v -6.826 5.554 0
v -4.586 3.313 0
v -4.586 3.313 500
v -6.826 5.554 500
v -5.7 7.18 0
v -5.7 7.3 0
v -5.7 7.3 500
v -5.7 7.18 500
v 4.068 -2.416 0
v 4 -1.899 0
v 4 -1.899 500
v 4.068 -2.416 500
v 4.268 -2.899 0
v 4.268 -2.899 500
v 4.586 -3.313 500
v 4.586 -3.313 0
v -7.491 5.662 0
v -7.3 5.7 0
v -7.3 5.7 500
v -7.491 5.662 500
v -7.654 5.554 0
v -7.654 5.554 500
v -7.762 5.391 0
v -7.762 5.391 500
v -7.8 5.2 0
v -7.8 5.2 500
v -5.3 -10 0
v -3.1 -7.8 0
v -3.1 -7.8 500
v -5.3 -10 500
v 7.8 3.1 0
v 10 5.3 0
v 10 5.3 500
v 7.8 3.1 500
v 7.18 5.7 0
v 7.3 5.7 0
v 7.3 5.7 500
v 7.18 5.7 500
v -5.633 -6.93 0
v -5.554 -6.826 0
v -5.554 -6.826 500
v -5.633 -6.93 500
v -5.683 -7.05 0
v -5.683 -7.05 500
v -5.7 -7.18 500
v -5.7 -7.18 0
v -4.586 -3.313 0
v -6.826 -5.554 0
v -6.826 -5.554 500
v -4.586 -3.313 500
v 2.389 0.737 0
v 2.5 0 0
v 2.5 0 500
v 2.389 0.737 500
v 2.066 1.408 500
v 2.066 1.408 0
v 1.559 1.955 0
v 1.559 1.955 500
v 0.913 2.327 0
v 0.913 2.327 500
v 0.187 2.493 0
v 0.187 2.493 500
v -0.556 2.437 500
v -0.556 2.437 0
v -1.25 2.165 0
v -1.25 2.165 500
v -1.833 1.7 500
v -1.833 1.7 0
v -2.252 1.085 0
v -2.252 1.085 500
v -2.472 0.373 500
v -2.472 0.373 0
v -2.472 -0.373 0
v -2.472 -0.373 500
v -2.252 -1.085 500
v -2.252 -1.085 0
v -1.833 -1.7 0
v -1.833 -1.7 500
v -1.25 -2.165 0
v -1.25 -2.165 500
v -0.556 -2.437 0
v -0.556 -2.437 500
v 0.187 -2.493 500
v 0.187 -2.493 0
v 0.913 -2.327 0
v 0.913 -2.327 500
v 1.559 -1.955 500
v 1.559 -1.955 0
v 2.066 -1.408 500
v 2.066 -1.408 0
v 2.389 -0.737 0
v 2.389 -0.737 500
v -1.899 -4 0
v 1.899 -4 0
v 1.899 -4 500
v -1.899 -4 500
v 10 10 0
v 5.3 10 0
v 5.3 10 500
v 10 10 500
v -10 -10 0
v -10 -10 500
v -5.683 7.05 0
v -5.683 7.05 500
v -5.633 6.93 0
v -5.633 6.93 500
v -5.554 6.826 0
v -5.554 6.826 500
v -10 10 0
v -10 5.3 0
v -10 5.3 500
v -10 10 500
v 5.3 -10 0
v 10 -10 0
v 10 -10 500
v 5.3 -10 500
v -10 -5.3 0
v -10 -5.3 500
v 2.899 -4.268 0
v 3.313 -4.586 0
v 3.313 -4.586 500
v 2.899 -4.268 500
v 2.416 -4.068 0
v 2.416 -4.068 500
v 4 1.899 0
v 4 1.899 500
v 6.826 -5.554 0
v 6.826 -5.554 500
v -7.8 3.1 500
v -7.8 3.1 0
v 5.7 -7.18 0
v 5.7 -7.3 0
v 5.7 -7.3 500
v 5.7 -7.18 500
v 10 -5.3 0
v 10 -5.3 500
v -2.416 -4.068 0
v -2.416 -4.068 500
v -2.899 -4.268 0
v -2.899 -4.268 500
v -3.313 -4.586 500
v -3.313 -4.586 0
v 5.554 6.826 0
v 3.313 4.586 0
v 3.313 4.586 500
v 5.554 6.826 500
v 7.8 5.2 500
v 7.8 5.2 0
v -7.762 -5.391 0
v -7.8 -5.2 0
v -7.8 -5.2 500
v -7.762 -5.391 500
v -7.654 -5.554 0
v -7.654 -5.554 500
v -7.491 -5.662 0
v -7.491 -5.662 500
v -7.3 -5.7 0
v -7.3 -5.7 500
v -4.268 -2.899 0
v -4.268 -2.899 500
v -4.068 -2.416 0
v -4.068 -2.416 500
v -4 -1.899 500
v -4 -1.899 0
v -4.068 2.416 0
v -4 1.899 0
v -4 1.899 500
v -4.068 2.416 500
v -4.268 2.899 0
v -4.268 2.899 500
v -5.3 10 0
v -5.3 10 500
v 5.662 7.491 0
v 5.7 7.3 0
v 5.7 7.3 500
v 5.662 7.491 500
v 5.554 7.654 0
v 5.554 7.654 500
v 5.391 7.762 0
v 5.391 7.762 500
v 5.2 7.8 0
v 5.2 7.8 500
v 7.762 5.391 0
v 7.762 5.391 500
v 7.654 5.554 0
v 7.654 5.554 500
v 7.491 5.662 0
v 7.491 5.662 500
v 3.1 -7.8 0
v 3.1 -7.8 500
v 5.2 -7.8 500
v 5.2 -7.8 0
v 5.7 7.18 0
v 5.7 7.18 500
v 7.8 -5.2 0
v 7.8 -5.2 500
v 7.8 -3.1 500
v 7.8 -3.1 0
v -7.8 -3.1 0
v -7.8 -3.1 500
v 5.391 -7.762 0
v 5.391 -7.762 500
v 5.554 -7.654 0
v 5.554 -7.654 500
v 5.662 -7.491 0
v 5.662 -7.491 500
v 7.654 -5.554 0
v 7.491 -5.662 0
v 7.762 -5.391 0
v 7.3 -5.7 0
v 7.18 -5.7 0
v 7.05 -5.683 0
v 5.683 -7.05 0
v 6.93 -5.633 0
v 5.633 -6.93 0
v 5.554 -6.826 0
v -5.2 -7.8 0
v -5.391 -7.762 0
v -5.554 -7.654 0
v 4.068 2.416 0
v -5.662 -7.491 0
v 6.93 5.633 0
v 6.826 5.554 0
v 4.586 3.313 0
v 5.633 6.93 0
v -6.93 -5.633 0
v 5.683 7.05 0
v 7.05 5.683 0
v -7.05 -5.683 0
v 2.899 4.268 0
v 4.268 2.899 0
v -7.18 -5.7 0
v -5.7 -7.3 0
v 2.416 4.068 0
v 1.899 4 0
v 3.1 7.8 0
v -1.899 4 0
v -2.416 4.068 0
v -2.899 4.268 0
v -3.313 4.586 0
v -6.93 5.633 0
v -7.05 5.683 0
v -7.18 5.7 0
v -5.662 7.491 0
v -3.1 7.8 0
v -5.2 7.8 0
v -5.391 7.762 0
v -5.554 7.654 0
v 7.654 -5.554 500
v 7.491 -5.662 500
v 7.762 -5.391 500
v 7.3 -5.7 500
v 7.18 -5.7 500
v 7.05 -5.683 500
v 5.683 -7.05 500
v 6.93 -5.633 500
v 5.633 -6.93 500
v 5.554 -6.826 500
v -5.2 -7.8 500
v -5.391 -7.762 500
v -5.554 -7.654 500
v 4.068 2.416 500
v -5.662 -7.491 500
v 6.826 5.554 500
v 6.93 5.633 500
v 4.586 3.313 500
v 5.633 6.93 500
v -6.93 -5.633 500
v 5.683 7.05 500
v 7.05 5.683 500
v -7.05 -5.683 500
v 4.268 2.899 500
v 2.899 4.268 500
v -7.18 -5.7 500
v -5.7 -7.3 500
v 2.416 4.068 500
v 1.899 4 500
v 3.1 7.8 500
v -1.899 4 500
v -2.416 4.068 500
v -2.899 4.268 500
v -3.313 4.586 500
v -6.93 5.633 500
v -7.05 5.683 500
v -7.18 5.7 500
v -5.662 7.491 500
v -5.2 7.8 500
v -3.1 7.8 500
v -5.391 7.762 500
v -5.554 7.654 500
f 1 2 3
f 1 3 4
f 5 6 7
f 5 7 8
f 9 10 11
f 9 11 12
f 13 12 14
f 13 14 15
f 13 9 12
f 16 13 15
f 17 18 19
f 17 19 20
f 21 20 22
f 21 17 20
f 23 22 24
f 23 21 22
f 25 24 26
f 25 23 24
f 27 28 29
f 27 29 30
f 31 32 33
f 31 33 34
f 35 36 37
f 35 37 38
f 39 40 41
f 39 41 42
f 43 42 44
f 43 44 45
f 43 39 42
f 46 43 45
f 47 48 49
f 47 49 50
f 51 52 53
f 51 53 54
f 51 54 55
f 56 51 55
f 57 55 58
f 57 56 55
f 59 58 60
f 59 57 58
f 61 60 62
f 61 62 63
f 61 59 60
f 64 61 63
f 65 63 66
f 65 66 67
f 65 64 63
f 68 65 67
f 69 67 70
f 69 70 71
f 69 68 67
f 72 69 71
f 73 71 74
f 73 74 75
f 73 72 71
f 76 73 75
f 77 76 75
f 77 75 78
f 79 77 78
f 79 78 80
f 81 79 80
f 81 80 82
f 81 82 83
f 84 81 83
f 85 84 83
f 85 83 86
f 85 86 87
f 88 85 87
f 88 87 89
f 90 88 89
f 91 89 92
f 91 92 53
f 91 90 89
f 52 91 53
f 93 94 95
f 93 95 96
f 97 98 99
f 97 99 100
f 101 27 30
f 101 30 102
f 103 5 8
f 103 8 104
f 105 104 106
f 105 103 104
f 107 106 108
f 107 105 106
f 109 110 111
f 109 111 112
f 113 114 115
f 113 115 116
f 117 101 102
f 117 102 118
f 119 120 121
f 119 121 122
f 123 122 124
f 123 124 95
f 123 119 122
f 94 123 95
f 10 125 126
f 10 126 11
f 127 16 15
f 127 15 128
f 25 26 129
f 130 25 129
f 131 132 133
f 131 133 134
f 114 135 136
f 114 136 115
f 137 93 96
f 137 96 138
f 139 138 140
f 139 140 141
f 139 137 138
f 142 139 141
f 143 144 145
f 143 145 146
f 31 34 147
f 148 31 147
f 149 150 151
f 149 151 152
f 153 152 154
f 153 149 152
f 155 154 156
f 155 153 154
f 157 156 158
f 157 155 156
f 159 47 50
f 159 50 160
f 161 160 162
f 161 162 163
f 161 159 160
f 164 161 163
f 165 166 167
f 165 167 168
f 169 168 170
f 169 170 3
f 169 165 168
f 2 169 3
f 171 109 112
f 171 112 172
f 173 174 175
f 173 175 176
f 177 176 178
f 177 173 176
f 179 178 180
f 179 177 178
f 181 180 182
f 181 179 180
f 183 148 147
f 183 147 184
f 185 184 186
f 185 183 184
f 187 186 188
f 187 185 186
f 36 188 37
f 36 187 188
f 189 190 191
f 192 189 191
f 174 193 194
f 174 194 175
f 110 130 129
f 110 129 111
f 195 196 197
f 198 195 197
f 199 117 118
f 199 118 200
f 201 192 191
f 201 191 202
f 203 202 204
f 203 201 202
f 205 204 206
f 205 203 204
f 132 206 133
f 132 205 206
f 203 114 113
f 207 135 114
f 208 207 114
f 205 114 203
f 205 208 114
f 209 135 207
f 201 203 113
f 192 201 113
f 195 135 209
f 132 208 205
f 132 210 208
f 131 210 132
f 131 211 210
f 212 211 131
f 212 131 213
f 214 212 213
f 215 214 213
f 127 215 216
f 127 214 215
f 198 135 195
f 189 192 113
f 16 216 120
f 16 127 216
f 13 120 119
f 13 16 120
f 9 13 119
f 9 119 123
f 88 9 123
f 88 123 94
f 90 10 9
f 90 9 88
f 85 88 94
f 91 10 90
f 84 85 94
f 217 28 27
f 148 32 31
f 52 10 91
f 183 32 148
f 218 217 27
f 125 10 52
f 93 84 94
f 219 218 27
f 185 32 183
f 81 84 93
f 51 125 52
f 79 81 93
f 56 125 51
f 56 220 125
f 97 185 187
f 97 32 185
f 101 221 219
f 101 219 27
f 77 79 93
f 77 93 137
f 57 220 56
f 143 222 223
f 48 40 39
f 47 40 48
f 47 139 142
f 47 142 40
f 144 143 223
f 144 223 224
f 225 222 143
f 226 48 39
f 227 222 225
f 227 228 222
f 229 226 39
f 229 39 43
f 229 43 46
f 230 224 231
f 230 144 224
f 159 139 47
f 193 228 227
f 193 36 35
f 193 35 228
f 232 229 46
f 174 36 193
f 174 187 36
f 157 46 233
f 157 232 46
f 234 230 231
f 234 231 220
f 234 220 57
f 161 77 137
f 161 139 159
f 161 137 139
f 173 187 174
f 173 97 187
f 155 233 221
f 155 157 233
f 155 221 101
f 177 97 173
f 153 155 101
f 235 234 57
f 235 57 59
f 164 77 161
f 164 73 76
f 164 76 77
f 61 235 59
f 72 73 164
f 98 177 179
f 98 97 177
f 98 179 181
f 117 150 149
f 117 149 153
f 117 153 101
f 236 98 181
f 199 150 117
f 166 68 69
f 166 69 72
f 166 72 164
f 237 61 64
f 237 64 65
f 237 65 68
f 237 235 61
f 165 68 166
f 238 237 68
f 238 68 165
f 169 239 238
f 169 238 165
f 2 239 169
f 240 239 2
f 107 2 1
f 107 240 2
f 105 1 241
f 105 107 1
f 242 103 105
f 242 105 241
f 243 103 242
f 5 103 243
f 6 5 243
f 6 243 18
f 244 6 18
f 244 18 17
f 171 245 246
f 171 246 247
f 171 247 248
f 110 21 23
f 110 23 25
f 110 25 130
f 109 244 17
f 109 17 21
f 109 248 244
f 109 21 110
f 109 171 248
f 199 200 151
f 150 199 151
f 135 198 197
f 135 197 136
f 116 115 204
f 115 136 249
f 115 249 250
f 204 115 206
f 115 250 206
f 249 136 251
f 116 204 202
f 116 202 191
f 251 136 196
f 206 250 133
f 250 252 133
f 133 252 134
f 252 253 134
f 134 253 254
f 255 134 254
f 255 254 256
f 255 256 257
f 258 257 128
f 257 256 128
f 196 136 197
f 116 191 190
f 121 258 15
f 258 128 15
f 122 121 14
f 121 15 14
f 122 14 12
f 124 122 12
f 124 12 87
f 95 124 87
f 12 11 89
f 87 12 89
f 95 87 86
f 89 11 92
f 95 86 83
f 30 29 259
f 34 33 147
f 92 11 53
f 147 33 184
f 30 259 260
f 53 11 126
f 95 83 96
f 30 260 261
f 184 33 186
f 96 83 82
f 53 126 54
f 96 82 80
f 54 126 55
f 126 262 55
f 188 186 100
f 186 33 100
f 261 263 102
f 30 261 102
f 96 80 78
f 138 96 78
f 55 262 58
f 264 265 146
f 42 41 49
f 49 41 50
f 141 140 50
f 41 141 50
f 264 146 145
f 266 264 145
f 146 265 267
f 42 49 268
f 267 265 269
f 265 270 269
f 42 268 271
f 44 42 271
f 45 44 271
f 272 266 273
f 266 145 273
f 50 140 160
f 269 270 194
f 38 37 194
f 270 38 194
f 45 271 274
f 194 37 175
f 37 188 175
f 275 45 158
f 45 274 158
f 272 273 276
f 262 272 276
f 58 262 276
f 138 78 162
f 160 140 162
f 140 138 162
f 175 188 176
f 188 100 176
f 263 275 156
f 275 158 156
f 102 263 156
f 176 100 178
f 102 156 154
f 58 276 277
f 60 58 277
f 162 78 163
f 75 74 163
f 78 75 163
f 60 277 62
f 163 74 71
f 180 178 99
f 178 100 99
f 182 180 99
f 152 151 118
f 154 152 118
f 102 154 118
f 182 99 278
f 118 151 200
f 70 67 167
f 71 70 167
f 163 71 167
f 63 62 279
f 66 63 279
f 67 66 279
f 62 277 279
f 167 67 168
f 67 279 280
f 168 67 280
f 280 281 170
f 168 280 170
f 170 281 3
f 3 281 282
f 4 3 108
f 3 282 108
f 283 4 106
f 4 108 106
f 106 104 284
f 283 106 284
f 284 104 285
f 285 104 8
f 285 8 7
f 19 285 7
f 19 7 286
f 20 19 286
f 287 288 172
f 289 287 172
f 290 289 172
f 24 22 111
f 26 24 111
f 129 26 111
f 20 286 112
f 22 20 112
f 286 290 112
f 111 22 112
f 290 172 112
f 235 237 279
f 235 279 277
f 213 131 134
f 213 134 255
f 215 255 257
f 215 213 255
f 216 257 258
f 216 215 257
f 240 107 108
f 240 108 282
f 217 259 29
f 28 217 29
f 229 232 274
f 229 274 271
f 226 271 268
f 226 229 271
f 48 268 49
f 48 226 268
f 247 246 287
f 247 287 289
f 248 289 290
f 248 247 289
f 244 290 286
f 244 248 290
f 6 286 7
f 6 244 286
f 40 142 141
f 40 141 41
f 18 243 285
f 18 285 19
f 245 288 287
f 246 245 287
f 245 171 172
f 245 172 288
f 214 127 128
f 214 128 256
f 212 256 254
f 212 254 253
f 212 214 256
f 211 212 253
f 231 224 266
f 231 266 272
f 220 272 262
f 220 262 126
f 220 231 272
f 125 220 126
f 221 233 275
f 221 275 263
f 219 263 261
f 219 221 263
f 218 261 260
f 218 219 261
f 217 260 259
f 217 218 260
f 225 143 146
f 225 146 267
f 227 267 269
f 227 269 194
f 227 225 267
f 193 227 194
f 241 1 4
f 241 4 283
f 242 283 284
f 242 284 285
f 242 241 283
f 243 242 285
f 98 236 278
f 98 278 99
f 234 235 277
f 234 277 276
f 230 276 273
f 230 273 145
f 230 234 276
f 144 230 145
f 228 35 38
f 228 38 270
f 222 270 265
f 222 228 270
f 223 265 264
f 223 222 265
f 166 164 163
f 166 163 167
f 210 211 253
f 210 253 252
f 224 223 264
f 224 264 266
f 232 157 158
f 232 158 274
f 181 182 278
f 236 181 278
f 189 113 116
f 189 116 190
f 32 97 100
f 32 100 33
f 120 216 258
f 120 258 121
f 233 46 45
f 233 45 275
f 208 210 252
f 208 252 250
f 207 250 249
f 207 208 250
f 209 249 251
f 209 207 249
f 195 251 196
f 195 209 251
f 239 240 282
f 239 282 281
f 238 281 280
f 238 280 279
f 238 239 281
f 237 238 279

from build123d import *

# Parameters (mm, degrees)
SKETCH1_R           = 2.5
BOSS_EXTRUDE2_DEPTH = 500


with BuildPart() as part:
    # Sketch1 → Boss-Extrude2 (new body)
    with BuildSketch(Plane.XY):
        with BuildLine():
            Line((-4, 0), (-4, 1.898780669))
            ThreePointArc((-4, 1.898780669), (-4.152240935, 2.664147534), (-4.585786438, 3.312994231))
            Line((-4.585786438, 3.312994231), (-6.826345597, 5.553553391))
            ThreePointArc((-6.826345597, 5.553553391), (-6.988557271, 5.661939766), (-7.179898987, 5.7))
            Line((-7.179898987, 5.7), (-7.3, 5.7))
            ThreePointArc((-7.3, 5.7), (-7.653553391, 5.553553391), (-7.8, 5.2))
            Line((-7.8, 5.2), (-7.8, 3.1))
            Line((-7.8, 3.1), (-10, 5.3))
            Line((-10, 5.3), (-10, 10))
            Line((-10, 10), (-5.3, 10))
            Line((-5.3, 10), (-3.1, 7.8))
            Line((-3.1, 7.8), (-5.2, 7.8))
            ThreePointArc((-5.2, 7.8), (-5.553553391, 7.653553391), (-5.7, 7.3))
            Line((-5.7, 7.3), (-5.7, 7.179898987))
            ThreePointArc((-5.7, 7.179898987), (-5.661939766, 6.988557271), (-5.553553391, 6.826345597))
            Line((-5.553553391, 6.826345597), (-3.312994231, 4.585786438))
            ThreePointArc((-3.312994231, 4.585786438), (-2.664147534, 4.152240935), (-1.898780669, 4))
            Line((-1.898780669, 4), (0, 4))
            Line((0, 4), (1.898780669, 4))
            ThreePointArc((1.898780669, 4), (2.664147534, 4.152240935), (3.312994231, 4.585786438))
            Line((3.312994231, 4.585786438), (5.553553391, 6.826345597))
            ThreePointArc((5.553553391, 6.826345597), (5.661939766, 6.988557271), (5.7, 7.179898987))
            Line((5.7, 7.179898987), (5.7, 7.3))
            ThreePointArc((5.7, 7.3), (5.553553391, 7.653553391), (5.2, 7.8))
            Line((5.2, 7.8), (3.1, 7.8))
            Line((3.1, 7.8), (5.3, 10))
            Line((5.3, 10), (10, 10))
            Line((10, 10), (10, 5.3))
            Line((10, 5.3), (7.8, 3.1))
            Line((7.8, 3.1), (7.8, 5.2))
            ThreePointArc((7.8, 5.2), (7.653553391, 5.553553391), (7.3, 5.7))
            Line((7.3, 5.7), (7.179898987, 5.7))
            ThreePointArc((7.179898987, 5.7), (6.988557271, 5.661939766), (6.826345597, 5.553553391))
            Line((6.826345597, 5.553553391), (4.585786438, 3.312994231))
            ThreePointArc((4.585786438, 3.312994231), (4.152240935, 2.664147534), (4, 1.898780669))
            Line((4, 1.898780669), (4, 0))
            Line((4, 0), (4, -1.898780669))
            ThreePointArc((4, -1.898780669), (4.152240935, -2.664147534), (4.585786438, -3.312994231))
            Line((4.585786438, -3.312994231), (6.826345597, -5.553553391))
            ThreePointArc((6.826345597, -5.553553391), (6.988557271, -5.661939766), (7.179898987, -5.7))
            Line((7.179898987, -5.7), (7.3, -5.7))
            ThreePointArc((7.3, -5.7), (7.653553391, -5.553553391), (7.8, -5.2))
            Line((7.8, -5.2), (7.8, -3.1))
            Line((7.8, -3.1), (10, -5.3))
            Line((10, -5.3), (10, -10))
            Line((10, -10), (5.3, -10))
            Line((5.3, -10), (3.1, -7.8))
            Line((3.1, -7.8), (5.2, -7.8))
            ThreePointArc((5.2, -7.8), (5.553553391, -7.653553391), (5.7, -7.3))
            Line((5.7, -7.3), (5.7, -7.179898987))
            ThreePointArc((5.7, -7.179898987), (5.661939766, -6.988557271), (5.553553391, -6.826345597))
            Line((5.553553391, -6.826345597), (3.312994231, -4.585786438))
            ThreePointArc((3.312994231, -4.585786438), (2.664147534, -4.152240935), (1.898780669, -4))
            Line((1.898780669, -4), (0, -4))
            Line((0, -4), (-1.898780669, -4))
            ThreePointArc((-1.898780669, -4), (-2.664147534, -4.152240935), (-3.312994231, -4.585786438))
            Line((-3.312994231, -4.585786438), (-5.553553391, -6.826345597))
            ThreePointArc((-5.553553391, -6.826345597), (-5.661939766, -6.988557271), (-5.7, -7.179898987))
            Line((-5.7, -7.179898987), (-5.7, -7.3))
            ThreePointArc((-5.7, -7.3), (-5.553553391, -7.653553391), (-5.2, -7.8))
            Line((-5.2, -7.8), (-3.1, -7.8))
            Line((-3.1, -7.8), (-5.3, -10))
            Line((-5.3, -10), (-10, -10))
            Line((-10, -10), (-10, -5.3))
            Line((-10, -5.3), (-7.8, -3.1))
            Line((-7.8, -3.1), (-7.8, -5.2))
            ThreePointArc((-7.8, -5.2), (-7.653553391, -5.553553391), (-7.3, -5.7))
            Line((-7.3, -5.7), (-7.179898987, -5.7))
            ThreePointArc((-7.179898987, -5.7), (-6.988557271, -5.661939766), (-6.826345597, -5.553553391))
            Line((-6.826345597, -5.553553391), (-4.585786438, -3.312994231))
            ThreePointArc((-4.585786438, -3.312994231), (-4.152240935, -2.664147534), (-4, -1.898780669))
            Line((-4, -1.898780669), (-4, 0))
        make_face()
        Circle(SKETCH1_R, mode=Mode.SUBTRACT)
    extrude(amount=BOSS_EXTRUDE2_DEPTH)


solid = part.part
